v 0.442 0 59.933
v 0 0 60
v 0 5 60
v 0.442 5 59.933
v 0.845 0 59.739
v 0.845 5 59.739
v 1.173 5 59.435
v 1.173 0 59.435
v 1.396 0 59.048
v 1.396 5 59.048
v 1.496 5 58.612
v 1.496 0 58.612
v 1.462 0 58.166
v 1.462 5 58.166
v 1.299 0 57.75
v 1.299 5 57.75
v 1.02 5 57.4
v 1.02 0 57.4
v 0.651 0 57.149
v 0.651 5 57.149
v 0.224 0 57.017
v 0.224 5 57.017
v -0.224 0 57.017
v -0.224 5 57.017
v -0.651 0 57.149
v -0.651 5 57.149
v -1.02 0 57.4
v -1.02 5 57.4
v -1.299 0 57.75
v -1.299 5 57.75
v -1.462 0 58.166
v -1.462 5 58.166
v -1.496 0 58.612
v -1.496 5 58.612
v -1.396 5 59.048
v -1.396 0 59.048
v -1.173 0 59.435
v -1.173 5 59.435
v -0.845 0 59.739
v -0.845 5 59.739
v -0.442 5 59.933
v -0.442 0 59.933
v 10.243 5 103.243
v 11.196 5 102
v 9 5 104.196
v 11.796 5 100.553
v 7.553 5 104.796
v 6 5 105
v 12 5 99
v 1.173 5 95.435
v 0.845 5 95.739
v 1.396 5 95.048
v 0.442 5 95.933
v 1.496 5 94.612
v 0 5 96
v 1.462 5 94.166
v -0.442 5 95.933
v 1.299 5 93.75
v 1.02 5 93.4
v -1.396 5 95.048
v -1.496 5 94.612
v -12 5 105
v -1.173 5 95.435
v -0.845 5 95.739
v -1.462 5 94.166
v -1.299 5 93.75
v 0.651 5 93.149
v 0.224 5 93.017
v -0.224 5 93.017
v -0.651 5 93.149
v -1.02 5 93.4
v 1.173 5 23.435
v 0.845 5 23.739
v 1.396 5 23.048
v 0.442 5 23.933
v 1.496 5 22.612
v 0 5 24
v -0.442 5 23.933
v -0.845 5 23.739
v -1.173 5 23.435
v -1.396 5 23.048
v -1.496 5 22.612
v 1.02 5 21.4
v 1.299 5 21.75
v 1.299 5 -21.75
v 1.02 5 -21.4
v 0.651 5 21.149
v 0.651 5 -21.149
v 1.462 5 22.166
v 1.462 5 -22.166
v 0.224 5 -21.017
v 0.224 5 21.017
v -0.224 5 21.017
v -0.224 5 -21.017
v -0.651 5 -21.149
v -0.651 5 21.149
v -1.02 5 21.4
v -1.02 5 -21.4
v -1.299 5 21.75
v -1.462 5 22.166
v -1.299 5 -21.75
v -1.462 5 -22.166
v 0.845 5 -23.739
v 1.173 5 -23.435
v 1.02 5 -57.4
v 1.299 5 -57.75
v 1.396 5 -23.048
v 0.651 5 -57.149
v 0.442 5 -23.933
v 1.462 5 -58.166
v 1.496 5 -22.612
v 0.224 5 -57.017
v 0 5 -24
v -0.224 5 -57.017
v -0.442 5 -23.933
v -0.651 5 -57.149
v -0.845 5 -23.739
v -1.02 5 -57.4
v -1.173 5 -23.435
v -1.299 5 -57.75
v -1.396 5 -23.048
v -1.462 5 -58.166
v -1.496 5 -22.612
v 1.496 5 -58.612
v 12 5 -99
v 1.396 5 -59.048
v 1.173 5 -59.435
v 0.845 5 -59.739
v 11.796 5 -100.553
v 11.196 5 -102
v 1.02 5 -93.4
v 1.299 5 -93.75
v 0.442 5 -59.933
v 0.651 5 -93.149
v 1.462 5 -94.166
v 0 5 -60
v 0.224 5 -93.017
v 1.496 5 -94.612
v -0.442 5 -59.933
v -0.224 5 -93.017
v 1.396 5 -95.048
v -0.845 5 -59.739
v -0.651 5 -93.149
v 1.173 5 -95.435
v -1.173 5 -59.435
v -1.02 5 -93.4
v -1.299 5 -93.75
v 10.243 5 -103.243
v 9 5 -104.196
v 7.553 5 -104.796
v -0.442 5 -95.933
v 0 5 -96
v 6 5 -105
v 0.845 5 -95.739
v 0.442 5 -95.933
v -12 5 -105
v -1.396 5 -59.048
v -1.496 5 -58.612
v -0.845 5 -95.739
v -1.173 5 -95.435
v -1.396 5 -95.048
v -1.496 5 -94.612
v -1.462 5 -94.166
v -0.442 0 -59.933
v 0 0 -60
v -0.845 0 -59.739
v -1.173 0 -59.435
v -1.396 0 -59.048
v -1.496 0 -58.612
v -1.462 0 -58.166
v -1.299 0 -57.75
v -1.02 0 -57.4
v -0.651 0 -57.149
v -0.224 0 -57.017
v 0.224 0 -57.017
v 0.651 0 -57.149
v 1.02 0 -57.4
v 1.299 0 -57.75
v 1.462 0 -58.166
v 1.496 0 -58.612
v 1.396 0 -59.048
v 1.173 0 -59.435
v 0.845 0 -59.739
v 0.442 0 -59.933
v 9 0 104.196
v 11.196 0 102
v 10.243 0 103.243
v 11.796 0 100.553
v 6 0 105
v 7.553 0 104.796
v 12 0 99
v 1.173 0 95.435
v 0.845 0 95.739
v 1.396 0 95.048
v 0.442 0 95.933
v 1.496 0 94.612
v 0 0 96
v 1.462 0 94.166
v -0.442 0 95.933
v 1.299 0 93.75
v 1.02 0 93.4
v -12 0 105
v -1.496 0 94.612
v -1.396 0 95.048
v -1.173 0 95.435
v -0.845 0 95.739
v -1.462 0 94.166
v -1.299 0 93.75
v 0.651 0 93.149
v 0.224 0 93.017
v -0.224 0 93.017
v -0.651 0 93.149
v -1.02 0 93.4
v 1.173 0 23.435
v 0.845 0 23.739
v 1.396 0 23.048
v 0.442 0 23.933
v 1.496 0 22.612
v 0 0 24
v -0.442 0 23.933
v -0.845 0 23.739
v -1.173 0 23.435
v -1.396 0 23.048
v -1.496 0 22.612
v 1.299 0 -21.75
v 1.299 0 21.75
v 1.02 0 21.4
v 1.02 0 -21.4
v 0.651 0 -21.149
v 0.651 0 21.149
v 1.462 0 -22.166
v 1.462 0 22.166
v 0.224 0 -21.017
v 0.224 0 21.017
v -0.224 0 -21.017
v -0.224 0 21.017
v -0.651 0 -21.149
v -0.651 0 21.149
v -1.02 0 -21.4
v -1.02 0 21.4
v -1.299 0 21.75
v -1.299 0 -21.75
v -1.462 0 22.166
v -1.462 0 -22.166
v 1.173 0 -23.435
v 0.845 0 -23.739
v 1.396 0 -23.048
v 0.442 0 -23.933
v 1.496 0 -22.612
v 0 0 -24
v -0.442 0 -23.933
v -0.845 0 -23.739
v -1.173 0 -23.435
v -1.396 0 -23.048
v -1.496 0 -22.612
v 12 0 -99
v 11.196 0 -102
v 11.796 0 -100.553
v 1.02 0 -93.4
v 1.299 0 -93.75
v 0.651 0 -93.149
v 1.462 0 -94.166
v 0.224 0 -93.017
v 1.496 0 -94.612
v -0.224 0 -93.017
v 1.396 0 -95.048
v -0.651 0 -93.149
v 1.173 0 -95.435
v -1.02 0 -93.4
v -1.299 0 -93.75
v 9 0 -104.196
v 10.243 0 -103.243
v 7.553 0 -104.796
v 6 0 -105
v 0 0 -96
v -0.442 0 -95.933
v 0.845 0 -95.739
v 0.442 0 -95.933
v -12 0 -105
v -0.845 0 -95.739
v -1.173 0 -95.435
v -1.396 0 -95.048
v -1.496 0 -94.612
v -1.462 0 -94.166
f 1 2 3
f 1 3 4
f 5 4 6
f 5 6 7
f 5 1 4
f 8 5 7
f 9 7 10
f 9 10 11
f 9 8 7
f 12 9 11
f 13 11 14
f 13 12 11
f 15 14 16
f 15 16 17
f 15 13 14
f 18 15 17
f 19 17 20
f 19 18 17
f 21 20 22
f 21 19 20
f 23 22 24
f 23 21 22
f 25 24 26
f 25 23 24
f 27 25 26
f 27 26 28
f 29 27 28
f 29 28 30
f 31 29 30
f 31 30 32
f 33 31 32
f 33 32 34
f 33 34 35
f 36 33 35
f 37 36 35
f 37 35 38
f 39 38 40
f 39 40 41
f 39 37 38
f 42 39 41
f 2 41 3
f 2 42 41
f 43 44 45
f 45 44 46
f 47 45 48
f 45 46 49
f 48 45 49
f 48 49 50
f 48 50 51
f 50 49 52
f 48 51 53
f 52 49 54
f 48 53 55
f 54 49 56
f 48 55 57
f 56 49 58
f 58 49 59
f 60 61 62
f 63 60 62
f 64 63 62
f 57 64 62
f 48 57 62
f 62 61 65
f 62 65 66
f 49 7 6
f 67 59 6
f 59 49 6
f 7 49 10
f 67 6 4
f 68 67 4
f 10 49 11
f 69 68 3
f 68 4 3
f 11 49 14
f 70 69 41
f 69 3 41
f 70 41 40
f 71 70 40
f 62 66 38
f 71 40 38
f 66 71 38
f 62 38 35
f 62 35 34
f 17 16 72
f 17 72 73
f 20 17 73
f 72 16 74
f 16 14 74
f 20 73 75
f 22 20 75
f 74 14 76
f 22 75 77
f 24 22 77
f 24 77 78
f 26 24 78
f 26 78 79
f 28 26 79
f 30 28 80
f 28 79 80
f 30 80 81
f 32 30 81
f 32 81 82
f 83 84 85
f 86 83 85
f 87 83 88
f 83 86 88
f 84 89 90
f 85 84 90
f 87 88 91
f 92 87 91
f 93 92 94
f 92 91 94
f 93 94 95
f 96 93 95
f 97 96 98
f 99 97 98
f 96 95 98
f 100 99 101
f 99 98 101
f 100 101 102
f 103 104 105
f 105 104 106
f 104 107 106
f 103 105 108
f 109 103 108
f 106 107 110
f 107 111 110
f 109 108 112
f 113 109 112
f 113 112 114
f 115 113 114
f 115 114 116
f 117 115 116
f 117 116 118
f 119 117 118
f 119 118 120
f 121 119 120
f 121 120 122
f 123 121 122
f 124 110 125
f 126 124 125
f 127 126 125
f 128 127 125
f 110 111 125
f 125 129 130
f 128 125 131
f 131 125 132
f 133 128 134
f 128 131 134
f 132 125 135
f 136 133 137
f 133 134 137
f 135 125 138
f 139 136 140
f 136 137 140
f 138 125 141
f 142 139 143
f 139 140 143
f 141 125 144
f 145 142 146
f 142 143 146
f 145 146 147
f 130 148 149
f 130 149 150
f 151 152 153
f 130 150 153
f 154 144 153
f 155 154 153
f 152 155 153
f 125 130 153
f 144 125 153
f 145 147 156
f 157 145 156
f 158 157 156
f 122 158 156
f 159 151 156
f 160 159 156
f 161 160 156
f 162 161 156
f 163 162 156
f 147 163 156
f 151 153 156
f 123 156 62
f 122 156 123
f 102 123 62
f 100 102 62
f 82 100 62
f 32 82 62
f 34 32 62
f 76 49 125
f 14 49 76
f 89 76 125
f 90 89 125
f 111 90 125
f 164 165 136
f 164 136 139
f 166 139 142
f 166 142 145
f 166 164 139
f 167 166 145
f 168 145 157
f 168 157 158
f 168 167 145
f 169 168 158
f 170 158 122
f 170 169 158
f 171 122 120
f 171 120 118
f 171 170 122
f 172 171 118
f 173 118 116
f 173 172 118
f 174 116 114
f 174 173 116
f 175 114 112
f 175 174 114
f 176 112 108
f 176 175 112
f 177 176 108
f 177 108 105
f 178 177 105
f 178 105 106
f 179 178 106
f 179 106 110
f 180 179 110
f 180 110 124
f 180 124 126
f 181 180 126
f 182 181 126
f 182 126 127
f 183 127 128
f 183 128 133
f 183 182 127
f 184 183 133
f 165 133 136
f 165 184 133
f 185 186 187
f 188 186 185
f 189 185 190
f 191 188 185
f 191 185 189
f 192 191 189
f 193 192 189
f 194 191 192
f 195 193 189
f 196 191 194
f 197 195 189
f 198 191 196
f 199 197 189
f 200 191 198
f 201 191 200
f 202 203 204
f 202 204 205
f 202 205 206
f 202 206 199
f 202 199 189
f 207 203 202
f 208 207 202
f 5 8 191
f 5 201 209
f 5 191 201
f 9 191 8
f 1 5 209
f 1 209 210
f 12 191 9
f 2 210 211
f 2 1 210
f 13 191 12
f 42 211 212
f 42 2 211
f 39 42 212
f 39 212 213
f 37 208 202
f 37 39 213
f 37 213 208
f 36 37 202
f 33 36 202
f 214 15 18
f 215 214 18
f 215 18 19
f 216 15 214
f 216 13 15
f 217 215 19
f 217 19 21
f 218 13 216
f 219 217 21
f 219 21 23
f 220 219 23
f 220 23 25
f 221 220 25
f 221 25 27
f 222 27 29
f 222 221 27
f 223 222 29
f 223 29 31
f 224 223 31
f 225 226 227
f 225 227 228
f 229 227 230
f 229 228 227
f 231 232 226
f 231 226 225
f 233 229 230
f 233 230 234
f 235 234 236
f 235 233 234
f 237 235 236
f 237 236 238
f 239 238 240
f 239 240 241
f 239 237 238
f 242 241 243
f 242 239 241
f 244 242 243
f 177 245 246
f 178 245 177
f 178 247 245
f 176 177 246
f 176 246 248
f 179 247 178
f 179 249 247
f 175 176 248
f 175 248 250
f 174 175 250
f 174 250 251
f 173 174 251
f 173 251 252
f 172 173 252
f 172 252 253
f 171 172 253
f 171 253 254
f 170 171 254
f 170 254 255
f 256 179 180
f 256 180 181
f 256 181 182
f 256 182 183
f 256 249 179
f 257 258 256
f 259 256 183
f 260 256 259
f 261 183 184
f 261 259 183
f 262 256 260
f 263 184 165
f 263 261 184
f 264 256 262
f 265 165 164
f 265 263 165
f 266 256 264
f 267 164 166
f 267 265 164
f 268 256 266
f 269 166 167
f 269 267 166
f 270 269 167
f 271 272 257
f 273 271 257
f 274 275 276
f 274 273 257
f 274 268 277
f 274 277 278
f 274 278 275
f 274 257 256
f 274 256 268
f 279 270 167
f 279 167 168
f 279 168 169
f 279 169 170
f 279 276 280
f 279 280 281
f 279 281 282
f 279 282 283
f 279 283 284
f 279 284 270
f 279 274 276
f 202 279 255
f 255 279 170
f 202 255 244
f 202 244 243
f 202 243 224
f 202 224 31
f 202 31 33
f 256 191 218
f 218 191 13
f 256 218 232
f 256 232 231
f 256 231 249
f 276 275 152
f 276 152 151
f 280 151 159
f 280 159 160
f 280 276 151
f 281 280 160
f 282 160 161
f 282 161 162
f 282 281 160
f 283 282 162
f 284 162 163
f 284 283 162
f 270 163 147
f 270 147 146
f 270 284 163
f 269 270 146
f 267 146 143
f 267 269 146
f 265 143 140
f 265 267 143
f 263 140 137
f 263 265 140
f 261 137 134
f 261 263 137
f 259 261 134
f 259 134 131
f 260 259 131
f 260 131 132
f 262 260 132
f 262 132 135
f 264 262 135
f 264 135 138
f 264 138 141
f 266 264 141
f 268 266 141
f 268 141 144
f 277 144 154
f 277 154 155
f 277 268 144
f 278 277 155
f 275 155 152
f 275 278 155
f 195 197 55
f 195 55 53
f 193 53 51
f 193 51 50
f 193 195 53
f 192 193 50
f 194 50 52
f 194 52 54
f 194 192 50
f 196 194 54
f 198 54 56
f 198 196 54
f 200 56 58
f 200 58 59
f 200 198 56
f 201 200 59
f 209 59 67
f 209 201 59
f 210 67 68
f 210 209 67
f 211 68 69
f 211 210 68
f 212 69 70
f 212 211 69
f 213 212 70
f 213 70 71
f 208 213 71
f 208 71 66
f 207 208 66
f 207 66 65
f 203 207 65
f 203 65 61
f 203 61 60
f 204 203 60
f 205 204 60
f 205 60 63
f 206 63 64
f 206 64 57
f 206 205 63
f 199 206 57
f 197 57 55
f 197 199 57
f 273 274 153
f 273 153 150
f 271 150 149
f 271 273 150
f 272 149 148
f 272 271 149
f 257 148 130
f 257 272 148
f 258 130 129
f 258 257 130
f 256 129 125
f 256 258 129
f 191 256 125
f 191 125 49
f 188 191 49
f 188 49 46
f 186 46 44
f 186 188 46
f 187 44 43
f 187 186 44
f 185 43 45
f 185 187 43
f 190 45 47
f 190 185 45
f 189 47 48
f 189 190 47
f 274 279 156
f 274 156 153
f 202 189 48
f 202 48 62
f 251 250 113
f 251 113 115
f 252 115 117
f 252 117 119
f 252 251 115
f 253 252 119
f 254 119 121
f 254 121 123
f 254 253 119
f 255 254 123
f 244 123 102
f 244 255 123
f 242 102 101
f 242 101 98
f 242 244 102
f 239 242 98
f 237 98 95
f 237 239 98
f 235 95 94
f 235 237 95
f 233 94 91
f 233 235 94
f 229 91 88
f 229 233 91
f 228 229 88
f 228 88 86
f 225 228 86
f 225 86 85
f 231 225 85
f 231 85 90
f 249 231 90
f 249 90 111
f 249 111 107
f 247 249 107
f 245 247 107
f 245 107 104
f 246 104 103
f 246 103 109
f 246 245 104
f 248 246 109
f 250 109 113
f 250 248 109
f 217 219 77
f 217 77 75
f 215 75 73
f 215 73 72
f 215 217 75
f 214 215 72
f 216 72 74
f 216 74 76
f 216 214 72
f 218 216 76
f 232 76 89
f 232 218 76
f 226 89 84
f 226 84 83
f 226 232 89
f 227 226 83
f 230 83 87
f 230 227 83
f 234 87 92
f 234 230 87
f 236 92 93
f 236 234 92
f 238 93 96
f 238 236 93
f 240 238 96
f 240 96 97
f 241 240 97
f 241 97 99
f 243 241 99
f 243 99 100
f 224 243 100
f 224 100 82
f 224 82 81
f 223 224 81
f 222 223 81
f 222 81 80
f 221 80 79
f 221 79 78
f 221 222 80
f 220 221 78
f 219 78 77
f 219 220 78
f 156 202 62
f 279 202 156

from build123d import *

# Parameters (mm, degrees)
SKETCH1_R           = 1.5
BOSS_EXTRUDE1_DEPTH = 5


with BuildPart() as part:
    # Sketch1 → Boss-Extrude1 (new body)
    with BuildSketch(Plane(origin=(0, 0, 0), x_dir=(1, 0, 0), z_dir=(0, 1, 0))):
        with BuildLine():
            Line((-12, -105), (-12, 105))
            Line((-12, 105), (6, 105))
            ThreePointArc((6, 105), (10.242640687, 103.242640687), (12, 99))
            Line((12, 99), (12, -99))
            ThreePointArc((12, -99), (10.242640687, -103.242640687), (6, -105))
            Line((6, -105), (-12, -105))
        make_face()
        with Locations(Location((0, -94.5, 0), (0, 0, 270))):
            Circle(SKETCH1_R, mode=Mode.SUBTRACT)
        with Locations(Location((0, -58.5, 0), (0, 0, 270))):
            Circle(SKETCH1_R, mode=Mode.SUBTRACT)
        with Locations(Location((0, -22.5, 0), (0, 0, 270))):
            Circle(SKETCH1_R, mode=Mode.SUBTRACT)
        with Locations(Location((0, 94.5, 0), (0, 0, 90))):
            Circle(SKETCH1_R, mode=Mode.SUBTRACT)
        with Locations(Location((0, 58.5, 0), (0, 0, 90))):
            Circle(SKETCH1_R, mode=Mode.SUBTRACT)
        with Locations(Location((0, 22.5, 0), (0, 0, 90))):
            Circle(SKETCH1_R, mode=Mode.SUBTRACT)
    extrude(amount=BOSS_EXTRUDE1_DEPTH)


solid = part.part
